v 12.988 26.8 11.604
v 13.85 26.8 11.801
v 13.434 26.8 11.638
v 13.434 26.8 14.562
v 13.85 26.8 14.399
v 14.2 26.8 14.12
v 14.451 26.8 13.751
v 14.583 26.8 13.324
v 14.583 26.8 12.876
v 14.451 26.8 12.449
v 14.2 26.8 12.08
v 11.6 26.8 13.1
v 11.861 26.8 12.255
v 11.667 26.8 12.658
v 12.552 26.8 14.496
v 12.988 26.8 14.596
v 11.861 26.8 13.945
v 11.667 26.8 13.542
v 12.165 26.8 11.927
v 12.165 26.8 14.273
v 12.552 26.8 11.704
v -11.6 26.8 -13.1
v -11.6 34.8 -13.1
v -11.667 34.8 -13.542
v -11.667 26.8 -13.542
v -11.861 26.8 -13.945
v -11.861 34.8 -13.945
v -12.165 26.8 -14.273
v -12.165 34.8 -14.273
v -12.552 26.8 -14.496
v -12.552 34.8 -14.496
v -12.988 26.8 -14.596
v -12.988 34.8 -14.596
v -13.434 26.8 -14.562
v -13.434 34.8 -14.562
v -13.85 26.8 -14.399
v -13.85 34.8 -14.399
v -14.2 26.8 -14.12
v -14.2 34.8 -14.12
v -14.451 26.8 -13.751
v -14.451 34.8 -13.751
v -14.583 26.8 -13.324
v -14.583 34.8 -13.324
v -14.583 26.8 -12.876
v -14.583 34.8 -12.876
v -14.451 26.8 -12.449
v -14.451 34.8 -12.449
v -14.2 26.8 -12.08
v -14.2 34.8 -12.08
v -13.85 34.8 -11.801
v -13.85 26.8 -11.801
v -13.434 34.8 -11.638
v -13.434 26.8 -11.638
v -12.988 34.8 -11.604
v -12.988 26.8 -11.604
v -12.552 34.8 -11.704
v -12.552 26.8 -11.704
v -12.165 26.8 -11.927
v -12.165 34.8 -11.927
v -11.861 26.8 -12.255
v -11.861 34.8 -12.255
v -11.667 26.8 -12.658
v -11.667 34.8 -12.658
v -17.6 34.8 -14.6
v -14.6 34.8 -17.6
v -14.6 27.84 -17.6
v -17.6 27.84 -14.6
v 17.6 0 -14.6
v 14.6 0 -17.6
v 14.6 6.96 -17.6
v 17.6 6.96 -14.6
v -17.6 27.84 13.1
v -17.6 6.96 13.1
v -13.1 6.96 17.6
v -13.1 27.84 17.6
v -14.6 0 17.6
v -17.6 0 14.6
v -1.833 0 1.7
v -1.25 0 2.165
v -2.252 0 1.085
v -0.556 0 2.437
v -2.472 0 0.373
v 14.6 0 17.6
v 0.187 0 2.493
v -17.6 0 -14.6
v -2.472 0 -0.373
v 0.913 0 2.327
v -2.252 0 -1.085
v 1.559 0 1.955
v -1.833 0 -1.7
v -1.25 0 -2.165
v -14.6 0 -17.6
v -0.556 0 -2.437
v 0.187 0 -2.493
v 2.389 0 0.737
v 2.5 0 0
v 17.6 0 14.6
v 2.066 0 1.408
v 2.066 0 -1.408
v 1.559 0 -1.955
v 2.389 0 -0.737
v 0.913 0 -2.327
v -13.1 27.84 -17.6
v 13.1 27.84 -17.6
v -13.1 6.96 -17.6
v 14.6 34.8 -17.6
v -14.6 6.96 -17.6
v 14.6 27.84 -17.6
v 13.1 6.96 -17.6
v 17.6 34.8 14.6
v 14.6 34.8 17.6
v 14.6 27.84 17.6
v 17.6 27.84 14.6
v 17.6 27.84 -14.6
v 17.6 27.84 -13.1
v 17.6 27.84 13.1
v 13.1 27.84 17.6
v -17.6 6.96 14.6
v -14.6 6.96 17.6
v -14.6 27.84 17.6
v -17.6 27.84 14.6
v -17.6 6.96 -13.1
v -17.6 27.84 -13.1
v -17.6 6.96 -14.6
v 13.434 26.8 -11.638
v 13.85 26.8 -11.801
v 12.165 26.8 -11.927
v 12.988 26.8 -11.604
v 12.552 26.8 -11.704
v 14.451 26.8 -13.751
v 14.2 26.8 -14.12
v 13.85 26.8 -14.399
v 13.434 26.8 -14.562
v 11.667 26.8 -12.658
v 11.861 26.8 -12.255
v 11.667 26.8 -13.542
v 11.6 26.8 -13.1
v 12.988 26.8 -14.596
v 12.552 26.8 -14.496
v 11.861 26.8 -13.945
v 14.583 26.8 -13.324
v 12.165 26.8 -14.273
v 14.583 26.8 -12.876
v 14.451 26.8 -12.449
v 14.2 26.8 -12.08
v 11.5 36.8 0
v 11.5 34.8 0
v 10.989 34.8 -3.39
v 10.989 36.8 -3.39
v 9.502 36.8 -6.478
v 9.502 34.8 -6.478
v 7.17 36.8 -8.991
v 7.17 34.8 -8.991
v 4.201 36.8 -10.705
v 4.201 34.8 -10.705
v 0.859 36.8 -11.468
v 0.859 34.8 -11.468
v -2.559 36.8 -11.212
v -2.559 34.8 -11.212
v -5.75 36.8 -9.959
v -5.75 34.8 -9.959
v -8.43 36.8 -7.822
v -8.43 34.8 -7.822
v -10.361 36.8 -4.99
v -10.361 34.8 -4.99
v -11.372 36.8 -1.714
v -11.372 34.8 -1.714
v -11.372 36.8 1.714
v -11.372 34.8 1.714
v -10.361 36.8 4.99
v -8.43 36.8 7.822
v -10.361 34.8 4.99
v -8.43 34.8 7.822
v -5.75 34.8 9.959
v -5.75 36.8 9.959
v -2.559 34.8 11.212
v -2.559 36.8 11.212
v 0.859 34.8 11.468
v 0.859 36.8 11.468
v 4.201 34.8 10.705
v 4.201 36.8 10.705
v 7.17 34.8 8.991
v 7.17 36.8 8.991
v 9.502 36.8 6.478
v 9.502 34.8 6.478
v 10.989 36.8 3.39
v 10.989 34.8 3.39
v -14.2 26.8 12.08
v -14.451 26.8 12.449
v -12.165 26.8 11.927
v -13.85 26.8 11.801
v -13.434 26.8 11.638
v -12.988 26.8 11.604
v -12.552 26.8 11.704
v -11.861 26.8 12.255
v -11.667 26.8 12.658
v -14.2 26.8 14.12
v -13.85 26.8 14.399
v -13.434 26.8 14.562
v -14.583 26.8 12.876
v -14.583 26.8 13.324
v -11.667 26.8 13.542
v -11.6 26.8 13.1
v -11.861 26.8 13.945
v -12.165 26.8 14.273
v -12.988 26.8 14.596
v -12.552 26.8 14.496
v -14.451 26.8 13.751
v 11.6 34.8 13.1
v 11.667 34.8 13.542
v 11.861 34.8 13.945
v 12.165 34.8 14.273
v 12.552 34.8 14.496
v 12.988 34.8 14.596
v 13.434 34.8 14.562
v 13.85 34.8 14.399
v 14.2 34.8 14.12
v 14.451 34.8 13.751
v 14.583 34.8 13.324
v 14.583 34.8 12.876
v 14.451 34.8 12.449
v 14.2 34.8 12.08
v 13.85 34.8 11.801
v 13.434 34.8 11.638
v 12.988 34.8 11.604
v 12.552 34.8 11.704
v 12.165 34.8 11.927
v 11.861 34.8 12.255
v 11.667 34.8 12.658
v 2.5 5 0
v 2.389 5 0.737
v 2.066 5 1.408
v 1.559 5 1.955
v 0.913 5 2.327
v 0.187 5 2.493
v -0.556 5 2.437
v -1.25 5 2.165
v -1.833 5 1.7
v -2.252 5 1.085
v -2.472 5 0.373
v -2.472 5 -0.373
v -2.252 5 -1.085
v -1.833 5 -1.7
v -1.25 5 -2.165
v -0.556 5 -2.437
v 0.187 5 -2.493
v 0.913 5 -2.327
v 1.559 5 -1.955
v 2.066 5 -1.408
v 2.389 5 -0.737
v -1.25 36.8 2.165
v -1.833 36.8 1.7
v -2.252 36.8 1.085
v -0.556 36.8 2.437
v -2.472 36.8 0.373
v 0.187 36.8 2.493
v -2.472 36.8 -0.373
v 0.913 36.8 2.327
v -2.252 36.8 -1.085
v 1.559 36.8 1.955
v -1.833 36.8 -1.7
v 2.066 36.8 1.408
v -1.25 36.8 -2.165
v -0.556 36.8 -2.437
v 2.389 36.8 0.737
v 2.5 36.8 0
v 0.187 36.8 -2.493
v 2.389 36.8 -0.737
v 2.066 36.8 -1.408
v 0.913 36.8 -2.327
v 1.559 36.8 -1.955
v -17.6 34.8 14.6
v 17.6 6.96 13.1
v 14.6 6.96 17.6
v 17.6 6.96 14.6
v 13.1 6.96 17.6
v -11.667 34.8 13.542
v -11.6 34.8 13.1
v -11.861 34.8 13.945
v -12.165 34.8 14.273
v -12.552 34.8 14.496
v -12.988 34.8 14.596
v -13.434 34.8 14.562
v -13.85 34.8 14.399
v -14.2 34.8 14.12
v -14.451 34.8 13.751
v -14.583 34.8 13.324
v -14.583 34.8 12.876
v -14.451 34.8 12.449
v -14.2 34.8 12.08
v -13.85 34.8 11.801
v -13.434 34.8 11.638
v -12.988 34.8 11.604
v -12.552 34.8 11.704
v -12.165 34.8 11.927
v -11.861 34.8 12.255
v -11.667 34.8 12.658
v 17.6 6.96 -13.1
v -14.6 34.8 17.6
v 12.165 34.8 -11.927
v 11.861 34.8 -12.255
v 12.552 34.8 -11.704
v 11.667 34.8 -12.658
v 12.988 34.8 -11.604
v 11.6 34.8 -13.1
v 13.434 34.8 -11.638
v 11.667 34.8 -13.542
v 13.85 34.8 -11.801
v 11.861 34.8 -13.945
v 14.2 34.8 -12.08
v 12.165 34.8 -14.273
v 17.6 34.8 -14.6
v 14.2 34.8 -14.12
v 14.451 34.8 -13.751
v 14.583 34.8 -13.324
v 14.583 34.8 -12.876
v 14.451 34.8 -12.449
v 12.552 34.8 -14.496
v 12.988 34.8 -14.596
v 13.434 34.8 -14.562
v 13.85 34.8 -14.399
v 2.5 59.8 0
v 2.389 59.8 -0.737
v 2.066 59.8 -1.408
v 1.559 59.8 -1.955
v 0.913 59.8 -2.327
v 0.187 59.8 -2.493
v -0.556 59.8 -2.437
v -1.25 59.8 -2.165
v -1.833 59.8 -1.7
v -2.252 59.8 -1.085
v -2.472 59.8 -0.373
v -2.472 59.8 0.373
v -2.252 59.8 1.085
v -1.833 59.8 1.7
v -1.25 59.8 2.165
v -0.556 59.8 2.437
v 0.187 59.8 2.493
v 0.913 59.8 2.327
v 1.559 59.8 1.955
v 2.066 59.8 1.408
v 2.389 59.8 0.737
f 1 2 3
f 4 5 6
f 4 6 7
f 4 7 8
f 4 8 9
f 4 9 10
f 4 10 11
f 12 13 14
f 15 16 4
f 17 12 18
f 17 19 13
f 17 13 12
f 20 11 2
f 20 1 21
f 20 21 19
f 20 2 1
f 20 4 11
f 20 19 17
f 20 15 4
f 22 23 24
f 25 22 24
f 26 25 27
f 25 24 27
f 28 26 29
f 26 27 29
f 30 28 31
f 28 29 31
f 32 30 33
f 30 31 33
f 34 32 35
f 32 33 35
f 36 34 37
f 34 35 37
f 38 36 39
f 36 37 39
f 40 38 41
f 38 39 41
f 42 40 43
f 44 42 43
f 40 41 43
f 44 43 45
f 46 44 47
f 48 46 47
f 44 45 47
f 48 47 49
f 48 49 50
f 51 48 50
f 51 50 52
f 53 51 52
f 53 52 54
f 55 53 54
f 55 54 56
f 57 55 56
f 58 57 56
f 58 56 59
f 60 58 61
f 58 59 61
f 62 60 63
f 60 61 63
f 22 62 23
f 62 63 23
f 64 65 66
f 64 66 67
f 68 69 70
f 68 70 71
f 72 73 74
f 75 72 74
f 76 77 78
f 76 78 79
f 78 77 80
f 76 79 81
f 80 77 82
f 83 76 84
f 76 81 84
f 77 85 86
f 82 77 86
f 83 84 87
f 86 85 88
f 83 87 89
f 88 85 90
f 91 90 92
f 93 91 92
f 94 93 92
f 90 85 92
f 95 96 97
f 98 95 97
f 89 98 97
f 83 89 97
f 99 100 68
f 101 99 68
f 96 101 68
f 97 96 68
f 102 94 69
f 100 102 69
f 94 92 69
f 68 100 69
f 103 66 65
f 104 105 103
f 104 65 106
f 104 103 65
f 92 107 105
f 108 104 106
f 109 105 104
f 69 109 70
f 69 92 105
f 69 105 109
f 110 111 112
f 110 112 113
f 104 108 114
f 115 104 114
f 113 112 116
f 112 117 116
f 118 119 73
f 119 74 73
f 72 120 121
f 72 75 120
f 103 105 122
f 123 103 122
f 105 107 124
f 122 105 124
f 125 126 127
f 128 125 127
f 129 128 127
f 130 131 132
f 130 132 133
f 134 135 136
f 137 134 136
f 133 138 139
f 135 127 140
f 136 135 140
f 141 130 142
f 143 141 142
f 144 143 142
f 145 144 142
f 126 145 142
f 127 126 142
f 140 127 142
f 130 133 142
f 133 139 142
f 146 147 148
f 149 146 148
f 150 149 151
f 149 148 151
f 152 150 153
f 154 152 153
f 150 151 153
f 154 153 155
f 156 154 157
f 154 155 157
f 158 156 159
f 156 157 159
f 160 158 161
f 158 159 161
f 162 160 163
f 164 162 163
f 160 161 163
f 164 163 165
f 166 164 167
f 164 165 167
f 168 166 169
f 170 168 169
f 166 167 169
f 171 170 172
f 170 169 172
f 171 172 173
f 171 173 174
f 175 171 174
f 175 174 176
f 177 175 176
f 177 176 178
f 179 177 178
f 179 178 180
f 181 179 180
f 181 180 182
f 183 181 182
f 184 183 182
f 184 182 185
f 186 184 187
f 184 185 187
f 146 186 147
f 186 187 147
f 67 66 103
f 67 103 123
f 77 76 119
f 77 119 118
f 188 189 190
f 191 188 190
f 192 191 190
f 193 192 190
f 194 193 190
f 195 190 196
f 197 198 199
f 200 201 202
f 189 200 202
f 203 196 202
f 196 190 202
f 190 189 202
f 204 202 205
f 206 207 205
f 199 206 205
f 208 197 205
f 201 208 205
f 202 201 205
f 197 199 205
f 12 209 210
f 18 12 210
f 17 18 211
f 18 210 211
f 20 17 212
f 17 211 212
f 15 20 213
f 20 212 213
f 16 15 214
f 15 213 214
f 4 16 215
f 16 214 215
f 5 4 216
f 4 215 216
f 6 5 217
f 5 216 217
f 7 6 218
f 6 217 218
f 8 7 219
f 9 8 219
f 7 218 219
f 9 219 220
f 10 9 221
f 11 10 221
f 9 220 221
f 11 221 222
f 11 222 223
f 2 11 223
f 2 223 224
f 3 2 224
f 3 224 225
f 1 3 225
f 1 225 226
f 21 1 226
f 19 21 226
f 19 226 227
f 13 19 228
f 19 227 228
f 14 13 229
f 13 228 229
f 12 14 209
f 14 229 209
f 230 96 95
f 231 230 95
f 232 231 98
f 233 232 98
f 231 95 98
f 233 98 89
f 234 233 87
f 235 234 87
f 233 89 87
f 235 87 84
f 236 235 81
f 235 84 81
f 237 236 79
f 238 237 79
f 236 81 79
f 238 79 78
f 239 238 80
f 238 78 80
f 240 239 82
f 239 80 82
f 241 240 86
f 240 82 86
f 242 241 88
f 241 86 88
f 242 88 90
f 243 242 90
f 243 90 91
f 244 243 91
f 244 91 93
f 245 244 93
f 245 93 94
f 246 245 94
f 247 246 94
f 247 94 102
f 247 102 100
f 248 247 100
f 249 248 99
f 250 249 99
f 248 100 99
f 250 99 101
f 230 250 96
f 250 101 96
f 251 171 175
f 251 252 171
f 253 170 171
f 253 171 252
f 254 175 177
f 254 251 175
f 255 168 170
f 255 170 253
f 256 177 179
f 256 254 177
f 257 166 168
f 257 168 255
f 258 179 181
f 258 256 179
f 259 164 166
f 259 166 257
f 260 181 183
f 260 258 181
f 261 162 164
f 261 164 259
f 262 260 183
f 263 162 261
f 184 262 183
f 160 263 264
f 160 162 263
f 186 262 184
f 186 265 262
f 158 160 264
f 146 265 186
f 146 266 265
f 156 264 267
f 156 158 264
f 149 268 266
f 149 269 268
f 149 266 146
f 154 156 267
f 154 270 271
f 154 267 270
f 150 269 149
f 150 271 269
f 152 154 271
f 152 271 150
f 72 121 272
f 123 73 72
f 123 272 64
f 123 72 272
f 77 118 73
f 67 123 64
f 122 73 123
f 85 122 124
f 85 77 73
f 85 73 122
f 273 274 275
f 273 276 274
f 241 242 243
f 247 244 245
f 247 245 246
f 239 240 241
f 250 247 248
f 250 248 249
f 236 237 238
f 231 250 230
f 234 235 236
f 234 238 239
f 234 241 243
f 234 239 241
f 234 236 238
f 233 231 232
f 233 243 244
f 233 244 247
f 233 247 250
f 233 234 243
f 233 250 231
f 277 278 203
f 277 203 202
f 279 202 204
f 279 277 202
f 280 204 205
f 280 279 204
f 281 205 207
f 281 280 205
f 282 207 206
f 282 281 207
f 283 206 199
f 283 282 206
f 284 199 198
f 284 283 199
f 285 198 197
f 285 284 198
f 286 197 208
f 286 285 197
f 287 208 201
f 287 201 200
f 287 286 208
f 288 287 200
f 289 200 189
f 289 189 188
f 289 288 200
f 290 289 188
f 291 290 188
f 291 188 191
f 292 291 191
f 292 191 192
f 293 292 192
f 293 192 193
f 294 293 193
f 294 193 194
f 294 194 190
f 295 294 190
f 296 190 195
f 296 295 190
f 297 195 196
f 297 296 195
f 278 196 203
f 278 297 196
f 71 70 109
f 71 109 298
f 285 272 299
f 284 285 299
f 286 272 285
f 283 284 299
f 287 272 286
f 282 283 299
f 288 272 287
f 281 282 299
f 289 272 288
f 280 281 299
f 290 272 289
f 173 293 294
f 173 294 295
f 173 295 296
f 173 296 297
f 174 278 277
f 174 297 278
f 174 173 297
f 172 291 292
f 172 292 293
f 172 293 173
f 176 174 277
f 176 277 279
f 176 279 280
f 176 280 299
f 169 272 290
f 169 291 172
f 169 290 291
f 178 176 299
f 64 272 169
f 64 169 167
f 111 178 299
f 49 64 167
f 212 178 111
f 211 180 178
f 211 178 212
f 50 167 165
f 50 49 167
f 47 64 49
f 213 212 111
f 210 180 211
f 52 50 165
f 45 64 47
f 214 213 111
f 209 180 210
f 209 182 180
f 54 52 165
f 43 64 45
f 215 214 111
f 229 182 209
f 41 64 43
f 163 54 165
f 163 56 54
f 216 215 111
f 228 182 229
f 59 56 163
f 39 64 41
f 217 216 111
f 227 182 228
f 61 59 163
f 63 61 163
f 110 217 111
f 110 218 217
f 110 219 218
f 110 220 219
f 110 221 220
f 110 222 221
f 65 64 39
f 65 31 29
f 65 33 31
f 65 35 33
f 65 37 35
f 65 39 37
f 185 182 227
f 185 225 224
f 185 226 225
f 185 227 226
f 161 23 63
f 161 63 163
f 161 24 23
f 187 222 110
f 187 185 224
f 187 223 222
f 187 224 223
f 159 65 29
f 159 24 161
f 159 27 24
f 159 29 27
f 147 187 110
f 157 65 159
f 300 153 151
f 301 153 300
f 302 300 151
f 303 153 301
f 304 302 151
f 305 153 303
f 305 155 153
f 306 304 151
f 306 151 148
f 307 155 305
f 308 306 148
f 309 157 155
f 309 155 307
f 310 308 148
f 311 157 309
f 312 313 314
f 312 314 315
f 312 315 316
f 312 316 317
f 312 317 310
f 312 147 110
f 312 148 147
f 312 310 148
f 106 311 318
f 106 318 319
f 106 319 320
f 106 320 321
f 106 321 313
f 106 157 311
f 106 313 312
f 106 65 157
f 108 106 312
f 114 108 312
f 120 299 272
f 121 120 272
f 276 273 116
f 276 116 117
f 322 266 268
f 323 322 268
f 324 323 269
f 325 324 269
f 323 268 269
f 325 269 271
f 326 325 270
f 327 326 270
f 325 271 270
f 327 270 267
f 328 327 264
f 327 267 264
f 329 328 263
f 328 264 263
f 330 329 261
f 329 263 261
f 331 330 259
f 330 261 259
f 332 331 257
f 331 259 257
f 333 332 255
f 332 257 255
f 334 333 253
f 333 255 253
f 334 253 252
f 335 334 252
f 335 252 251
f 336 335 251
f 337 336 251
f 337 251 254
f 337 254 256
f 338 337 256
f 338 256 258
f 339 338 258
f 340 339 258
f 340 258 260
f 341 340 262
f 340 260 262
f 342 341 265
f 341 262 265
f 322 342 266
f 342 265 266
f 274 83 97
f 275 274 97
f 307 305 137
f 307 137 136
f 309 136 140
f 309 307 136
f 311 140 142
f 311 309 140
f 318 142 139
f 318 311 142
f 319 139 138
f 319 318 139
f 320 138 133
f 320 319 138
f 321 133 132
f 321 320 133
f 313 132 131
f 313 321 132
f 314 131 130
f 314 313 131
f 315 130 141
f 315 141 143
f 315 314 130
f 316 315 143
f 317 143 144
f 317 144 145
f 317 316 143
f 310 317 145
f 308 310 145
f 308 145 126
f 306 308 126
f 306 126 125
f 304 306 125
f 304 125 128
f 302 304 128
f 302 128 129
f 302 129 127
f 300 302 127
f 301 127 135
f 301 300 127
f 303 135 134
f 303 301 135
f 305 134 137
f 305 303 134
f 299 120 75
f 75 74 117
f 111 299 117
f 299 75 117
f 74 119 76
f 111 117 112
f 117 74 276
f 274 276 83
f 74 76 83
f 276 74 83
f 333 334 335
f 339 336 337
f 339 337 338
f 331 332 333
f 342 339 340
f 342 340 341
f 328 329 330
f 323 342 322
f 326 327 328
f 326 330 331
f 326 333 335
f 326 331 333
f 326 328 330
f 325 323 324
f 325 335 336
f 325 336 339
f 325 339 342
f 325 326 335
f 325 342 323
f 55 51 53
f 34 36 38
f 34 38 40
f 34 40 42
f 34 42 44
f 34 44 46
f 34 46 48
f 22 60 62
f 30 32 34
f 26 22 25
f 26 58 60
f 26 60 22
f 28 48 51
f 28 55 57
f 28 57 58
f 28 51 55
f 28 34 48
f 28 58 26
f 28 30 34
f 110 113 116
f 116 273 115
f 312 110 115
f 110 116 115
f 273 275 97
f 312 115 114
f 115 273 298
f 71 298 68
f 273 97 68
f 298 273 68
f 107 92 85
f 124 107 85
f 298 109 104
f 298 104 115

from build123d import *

# Parameters (mm, degrees)
SKETCH1_W               = 35.2
SKETCH1_H               = 35.2
BOSS_EXTRUDE1_DEPTH     = 34.8
SKETCH2_R               = 11.5
BOSS_EXTRUDE2_DEPTH     = 2
SKETCH3_R               = 2.5
BOSS_EXTRUDE3_DEPTH     = 23
SKETCH4_R               = 1.5
CUT_EXTRUDE1_DEPTH      = 8
MIRROR2_COPY_1_SKETCH_R = 1.5
MIRROR2_COPY_1_DEPTH    = 8
CUT_EXTRUDE2_DEPTH      = 6.96
MIRROR4_COPY_1_DEPTH    = 6.96
CUT_EXTRUDE3_DEPTH      = 6.96
MIRROR6_COPY_1_DEPTH    = 6.96
SKETCH7_R               = 2.5
CUT_EXTRUDE4_DEPTH      = 5
CUT_EXTRUDE6_DEPTH      = 20.88
CUT_EXTRUDE7_DEPTH      = 20.88
CUT_EXTRUDE8_DEPTH      = 20.88
CUT_EXTRUDE9_DEPTH      = 20.88


with BuildPart() as part:
    # Sketch1 → Boss-Extrude1 (new body)
    with BuildSketch(Plane(origin=(0, 0, 0), x_dir=(1, 0, 0), z_dir=(0, 1, 0))):
        Rectangle(SKETCH1_W, SKETCH1_H)
    extrude(amount=BOSS_EXTRUDE1_DEPTH)

    # Sketch2 → Boss-Extrude2 (add)
    with BuildSketch(Plane(origin=(0, 34.8, 0), x_dir=(1, 0, 0), z_dir=(0, 1, 0))):
        Circle(SKETCH2_R)
    extrude(amount=BOSS_EXTRUDE2_DEPTH)

    # Sketch3 → Boss-Extrude3 (add)
    with BuildSketch(Plane(origin=(0, 36.8, 0), x_dir=(1, 0, 0), z_dir=(0, 1, 0))):
        Circle(SKETCH3_R)
    extrude(amount=BOSS_EXTRUDE3_DEPTH)

    # Sketch4 → Cut-Extrude1 (cut)
    with BuildSketch(Plane(origin=(0, 34.8, 0), x_dir=(1, 0, 0), z_dir=(0, 1, 0))):
        with Locations((-13.1, 13.1)):
            Circle(SKETCH4_R)
    cut_extrude1 = extrude(amount=-CUT_EXTRUDE1_DEPTH, mode=Mode.SUBTRACT)

    # Mirror1: Cut-Extrude1 across plane
    add(cut_extrude1.mirror(Plane(origin=(0, 0, 0), x_dir=(0, 0, 1), z_dir=(1, 0, 0))), mode=Mode.SUBTRACT)

    # Mirror2: Cut-Extrude1 across plane
    add(cut_extrude1.mirror(Plane.XY), mode=Mode.SUBTRACT)

    # Mirror2 copy 1 sketch → Mirror2 copy 1 (cut)
    with BuildSketch(Plane(origin=(0, 34.8, 0), x_dir=(-1, 0, 0), z_dir=(0, 1, 0))):
        with Locations((-13.1, 13.1)):
            Circle(MIRROR2_COPY_1_SKETCH_R)
    extrude(amount=-MIRROR2_COPY_1_DEPTH, mode=Mode.SUBTRACT)

    # Sketch5 → Cut-Extrude2 (cut)
    with BuildSketch(Plane(origin=(0, 34.8, 0), x_dir=(1, 0, 0), z_dir=(0, 1, 0))):
        Polygon((-17.6, 17.6), (-14.6, 17.6), (-17.6, 14.6), align=None)
    cut_extrude2 = extrude(amount=-CUT_EXTRUDE2_DEPTH, mode=Mode.SUBTRACT)

    # Mirror3: Cut-Extrude2 across plane
    add(cut_extrude2.mirror(Plane(origin=(0, 0, 0), x_dir=(0, 0, 1), z_dir=(1, 0, 0))), mode=Mode.SUBTRACT)

    # Mirror4: Cut-Extrude2 across plane
    add(cut_extrude2.mirror(Plane.XY), mode=Mode.SUBTRACT)

    # Mirror4 copy 1 sketch → Mirror4 copy 1 (cut)
    with BuildSketch(Plane(origin=(0, 34.8, 0), x_dir=(-1, 0, 0), z_dir=(0, 1, 0))):
        Polygon((-17.6, 17.6), (-14.6, 17.6), (-17.6, 14.6), align=None)
    extrude(amount=-MIRROR4_COPY_1_DEPTH, mode=Mode.SUBTRACT)

    # Sketch6 → Cut-Extrude3 (cut)
    with BuildSketch(Plane.XZ):
        Polygon((-17.6, 17.6), (-14.6, 17.6), (-17.6, 14.6), align=None)
    cut_extrude3 = extrude(amount=-CUT_EXTRUDE3_DEPTH, mode=Mode.SUBTRACT)

    # Mirror5: Cut-Extrude3 across plane
    add(cut_extrude3.mirror(Plane(origin=(0, 0, 0), x_dir=(0, 0, 1), z_dir=(1, 0, 0))), mode=Mode.SUBTRACT)

    # Mirror6: Cut-Extrude3 across plane
    add(cut_extrude3.mirror(Plane.XY), mode=Mode.SUBTRACT)

    # Mirror6 copy 1 sketch → Mirror6 copy 1 (cut)
    with BuildSketch(Plane(origin=(0, 0, 0), x_dir=(-1, 0, 0), z_dir=(0, -1, 0))):
        Polygon((-17.6, 17.6), (-14.6, 17.6), (-17.6, 14.6), align=None)
    extrude(amount=-MIRROR6_COPY_1_DEPTH, mode=Mode.SUBTRACT)

    # Sketch7 → Cut-Extrude4 (cut)
    with BuildSketch(Plane.XZ):
        Circle(SKETCH7_R)
    extrude(amount=-CUT_EXTRUDE4_DEPTH, mode=Mode.SUBTRACT)

    # Sketch8 → Cut-Extrude6 (cut)
    with BuildSketch(Plane(origin=(0, 27.84, 0), x_dir=(1, 0, 0), z_dir=(0, 1, 0))):
        Polygon((-17.6, 17.6), (-13.1, 17.6), (-17.6, 13.1), align=None)
    extrude(amount=-CUT_EXTRUDE6_DEPTH, mode=Mode.SUBTRACT)

    # Sketch9 → Cut-Extrude7 (cut)
    with BuildSketch(Plane(origin=(0, 27.84, 0), x_dir=(1, 0, 0), z_dir=(0, 1, 0))):
        Polygon((17.6, 17.6), (13.1, 17.6), (17.6, 13.1), align=None)
    extrude(amount=-CUT_EXTRUDE7_DEPTH, mode=Mode.SUBTRACT)

    # Sketch10 → Cut-Extrude8 (cut)
    with BuildSketch(Plane(origin=(0, 27.84, 0), x_dir=(1, 0, 0), z_dir=(0, 1, 0))):
        Polygon((17.6, -17.6), (17.6, -13.1), (13.1, -17.6), align=None)
    extrude(amount=-CUT_EXTRUDE8_DEPTH, mode=Mode.SUBTRACT)

    # Sketch11 → Cut-Extrude9 (cut)
    with BuildSketch(Plane(origin=(0, 27.84, 0), x_dir=(1, 0, 0), z_dir=(0, 1, 0))):
        Polygon((-17.6, -17.6), (-17.6, -13.1), (-13.1, -17.6), align=None)
    extrude(amount=-CUT_EXTRUDE9_DEPTH, mode=Mode.SUBTRACT)


solid = part.part
